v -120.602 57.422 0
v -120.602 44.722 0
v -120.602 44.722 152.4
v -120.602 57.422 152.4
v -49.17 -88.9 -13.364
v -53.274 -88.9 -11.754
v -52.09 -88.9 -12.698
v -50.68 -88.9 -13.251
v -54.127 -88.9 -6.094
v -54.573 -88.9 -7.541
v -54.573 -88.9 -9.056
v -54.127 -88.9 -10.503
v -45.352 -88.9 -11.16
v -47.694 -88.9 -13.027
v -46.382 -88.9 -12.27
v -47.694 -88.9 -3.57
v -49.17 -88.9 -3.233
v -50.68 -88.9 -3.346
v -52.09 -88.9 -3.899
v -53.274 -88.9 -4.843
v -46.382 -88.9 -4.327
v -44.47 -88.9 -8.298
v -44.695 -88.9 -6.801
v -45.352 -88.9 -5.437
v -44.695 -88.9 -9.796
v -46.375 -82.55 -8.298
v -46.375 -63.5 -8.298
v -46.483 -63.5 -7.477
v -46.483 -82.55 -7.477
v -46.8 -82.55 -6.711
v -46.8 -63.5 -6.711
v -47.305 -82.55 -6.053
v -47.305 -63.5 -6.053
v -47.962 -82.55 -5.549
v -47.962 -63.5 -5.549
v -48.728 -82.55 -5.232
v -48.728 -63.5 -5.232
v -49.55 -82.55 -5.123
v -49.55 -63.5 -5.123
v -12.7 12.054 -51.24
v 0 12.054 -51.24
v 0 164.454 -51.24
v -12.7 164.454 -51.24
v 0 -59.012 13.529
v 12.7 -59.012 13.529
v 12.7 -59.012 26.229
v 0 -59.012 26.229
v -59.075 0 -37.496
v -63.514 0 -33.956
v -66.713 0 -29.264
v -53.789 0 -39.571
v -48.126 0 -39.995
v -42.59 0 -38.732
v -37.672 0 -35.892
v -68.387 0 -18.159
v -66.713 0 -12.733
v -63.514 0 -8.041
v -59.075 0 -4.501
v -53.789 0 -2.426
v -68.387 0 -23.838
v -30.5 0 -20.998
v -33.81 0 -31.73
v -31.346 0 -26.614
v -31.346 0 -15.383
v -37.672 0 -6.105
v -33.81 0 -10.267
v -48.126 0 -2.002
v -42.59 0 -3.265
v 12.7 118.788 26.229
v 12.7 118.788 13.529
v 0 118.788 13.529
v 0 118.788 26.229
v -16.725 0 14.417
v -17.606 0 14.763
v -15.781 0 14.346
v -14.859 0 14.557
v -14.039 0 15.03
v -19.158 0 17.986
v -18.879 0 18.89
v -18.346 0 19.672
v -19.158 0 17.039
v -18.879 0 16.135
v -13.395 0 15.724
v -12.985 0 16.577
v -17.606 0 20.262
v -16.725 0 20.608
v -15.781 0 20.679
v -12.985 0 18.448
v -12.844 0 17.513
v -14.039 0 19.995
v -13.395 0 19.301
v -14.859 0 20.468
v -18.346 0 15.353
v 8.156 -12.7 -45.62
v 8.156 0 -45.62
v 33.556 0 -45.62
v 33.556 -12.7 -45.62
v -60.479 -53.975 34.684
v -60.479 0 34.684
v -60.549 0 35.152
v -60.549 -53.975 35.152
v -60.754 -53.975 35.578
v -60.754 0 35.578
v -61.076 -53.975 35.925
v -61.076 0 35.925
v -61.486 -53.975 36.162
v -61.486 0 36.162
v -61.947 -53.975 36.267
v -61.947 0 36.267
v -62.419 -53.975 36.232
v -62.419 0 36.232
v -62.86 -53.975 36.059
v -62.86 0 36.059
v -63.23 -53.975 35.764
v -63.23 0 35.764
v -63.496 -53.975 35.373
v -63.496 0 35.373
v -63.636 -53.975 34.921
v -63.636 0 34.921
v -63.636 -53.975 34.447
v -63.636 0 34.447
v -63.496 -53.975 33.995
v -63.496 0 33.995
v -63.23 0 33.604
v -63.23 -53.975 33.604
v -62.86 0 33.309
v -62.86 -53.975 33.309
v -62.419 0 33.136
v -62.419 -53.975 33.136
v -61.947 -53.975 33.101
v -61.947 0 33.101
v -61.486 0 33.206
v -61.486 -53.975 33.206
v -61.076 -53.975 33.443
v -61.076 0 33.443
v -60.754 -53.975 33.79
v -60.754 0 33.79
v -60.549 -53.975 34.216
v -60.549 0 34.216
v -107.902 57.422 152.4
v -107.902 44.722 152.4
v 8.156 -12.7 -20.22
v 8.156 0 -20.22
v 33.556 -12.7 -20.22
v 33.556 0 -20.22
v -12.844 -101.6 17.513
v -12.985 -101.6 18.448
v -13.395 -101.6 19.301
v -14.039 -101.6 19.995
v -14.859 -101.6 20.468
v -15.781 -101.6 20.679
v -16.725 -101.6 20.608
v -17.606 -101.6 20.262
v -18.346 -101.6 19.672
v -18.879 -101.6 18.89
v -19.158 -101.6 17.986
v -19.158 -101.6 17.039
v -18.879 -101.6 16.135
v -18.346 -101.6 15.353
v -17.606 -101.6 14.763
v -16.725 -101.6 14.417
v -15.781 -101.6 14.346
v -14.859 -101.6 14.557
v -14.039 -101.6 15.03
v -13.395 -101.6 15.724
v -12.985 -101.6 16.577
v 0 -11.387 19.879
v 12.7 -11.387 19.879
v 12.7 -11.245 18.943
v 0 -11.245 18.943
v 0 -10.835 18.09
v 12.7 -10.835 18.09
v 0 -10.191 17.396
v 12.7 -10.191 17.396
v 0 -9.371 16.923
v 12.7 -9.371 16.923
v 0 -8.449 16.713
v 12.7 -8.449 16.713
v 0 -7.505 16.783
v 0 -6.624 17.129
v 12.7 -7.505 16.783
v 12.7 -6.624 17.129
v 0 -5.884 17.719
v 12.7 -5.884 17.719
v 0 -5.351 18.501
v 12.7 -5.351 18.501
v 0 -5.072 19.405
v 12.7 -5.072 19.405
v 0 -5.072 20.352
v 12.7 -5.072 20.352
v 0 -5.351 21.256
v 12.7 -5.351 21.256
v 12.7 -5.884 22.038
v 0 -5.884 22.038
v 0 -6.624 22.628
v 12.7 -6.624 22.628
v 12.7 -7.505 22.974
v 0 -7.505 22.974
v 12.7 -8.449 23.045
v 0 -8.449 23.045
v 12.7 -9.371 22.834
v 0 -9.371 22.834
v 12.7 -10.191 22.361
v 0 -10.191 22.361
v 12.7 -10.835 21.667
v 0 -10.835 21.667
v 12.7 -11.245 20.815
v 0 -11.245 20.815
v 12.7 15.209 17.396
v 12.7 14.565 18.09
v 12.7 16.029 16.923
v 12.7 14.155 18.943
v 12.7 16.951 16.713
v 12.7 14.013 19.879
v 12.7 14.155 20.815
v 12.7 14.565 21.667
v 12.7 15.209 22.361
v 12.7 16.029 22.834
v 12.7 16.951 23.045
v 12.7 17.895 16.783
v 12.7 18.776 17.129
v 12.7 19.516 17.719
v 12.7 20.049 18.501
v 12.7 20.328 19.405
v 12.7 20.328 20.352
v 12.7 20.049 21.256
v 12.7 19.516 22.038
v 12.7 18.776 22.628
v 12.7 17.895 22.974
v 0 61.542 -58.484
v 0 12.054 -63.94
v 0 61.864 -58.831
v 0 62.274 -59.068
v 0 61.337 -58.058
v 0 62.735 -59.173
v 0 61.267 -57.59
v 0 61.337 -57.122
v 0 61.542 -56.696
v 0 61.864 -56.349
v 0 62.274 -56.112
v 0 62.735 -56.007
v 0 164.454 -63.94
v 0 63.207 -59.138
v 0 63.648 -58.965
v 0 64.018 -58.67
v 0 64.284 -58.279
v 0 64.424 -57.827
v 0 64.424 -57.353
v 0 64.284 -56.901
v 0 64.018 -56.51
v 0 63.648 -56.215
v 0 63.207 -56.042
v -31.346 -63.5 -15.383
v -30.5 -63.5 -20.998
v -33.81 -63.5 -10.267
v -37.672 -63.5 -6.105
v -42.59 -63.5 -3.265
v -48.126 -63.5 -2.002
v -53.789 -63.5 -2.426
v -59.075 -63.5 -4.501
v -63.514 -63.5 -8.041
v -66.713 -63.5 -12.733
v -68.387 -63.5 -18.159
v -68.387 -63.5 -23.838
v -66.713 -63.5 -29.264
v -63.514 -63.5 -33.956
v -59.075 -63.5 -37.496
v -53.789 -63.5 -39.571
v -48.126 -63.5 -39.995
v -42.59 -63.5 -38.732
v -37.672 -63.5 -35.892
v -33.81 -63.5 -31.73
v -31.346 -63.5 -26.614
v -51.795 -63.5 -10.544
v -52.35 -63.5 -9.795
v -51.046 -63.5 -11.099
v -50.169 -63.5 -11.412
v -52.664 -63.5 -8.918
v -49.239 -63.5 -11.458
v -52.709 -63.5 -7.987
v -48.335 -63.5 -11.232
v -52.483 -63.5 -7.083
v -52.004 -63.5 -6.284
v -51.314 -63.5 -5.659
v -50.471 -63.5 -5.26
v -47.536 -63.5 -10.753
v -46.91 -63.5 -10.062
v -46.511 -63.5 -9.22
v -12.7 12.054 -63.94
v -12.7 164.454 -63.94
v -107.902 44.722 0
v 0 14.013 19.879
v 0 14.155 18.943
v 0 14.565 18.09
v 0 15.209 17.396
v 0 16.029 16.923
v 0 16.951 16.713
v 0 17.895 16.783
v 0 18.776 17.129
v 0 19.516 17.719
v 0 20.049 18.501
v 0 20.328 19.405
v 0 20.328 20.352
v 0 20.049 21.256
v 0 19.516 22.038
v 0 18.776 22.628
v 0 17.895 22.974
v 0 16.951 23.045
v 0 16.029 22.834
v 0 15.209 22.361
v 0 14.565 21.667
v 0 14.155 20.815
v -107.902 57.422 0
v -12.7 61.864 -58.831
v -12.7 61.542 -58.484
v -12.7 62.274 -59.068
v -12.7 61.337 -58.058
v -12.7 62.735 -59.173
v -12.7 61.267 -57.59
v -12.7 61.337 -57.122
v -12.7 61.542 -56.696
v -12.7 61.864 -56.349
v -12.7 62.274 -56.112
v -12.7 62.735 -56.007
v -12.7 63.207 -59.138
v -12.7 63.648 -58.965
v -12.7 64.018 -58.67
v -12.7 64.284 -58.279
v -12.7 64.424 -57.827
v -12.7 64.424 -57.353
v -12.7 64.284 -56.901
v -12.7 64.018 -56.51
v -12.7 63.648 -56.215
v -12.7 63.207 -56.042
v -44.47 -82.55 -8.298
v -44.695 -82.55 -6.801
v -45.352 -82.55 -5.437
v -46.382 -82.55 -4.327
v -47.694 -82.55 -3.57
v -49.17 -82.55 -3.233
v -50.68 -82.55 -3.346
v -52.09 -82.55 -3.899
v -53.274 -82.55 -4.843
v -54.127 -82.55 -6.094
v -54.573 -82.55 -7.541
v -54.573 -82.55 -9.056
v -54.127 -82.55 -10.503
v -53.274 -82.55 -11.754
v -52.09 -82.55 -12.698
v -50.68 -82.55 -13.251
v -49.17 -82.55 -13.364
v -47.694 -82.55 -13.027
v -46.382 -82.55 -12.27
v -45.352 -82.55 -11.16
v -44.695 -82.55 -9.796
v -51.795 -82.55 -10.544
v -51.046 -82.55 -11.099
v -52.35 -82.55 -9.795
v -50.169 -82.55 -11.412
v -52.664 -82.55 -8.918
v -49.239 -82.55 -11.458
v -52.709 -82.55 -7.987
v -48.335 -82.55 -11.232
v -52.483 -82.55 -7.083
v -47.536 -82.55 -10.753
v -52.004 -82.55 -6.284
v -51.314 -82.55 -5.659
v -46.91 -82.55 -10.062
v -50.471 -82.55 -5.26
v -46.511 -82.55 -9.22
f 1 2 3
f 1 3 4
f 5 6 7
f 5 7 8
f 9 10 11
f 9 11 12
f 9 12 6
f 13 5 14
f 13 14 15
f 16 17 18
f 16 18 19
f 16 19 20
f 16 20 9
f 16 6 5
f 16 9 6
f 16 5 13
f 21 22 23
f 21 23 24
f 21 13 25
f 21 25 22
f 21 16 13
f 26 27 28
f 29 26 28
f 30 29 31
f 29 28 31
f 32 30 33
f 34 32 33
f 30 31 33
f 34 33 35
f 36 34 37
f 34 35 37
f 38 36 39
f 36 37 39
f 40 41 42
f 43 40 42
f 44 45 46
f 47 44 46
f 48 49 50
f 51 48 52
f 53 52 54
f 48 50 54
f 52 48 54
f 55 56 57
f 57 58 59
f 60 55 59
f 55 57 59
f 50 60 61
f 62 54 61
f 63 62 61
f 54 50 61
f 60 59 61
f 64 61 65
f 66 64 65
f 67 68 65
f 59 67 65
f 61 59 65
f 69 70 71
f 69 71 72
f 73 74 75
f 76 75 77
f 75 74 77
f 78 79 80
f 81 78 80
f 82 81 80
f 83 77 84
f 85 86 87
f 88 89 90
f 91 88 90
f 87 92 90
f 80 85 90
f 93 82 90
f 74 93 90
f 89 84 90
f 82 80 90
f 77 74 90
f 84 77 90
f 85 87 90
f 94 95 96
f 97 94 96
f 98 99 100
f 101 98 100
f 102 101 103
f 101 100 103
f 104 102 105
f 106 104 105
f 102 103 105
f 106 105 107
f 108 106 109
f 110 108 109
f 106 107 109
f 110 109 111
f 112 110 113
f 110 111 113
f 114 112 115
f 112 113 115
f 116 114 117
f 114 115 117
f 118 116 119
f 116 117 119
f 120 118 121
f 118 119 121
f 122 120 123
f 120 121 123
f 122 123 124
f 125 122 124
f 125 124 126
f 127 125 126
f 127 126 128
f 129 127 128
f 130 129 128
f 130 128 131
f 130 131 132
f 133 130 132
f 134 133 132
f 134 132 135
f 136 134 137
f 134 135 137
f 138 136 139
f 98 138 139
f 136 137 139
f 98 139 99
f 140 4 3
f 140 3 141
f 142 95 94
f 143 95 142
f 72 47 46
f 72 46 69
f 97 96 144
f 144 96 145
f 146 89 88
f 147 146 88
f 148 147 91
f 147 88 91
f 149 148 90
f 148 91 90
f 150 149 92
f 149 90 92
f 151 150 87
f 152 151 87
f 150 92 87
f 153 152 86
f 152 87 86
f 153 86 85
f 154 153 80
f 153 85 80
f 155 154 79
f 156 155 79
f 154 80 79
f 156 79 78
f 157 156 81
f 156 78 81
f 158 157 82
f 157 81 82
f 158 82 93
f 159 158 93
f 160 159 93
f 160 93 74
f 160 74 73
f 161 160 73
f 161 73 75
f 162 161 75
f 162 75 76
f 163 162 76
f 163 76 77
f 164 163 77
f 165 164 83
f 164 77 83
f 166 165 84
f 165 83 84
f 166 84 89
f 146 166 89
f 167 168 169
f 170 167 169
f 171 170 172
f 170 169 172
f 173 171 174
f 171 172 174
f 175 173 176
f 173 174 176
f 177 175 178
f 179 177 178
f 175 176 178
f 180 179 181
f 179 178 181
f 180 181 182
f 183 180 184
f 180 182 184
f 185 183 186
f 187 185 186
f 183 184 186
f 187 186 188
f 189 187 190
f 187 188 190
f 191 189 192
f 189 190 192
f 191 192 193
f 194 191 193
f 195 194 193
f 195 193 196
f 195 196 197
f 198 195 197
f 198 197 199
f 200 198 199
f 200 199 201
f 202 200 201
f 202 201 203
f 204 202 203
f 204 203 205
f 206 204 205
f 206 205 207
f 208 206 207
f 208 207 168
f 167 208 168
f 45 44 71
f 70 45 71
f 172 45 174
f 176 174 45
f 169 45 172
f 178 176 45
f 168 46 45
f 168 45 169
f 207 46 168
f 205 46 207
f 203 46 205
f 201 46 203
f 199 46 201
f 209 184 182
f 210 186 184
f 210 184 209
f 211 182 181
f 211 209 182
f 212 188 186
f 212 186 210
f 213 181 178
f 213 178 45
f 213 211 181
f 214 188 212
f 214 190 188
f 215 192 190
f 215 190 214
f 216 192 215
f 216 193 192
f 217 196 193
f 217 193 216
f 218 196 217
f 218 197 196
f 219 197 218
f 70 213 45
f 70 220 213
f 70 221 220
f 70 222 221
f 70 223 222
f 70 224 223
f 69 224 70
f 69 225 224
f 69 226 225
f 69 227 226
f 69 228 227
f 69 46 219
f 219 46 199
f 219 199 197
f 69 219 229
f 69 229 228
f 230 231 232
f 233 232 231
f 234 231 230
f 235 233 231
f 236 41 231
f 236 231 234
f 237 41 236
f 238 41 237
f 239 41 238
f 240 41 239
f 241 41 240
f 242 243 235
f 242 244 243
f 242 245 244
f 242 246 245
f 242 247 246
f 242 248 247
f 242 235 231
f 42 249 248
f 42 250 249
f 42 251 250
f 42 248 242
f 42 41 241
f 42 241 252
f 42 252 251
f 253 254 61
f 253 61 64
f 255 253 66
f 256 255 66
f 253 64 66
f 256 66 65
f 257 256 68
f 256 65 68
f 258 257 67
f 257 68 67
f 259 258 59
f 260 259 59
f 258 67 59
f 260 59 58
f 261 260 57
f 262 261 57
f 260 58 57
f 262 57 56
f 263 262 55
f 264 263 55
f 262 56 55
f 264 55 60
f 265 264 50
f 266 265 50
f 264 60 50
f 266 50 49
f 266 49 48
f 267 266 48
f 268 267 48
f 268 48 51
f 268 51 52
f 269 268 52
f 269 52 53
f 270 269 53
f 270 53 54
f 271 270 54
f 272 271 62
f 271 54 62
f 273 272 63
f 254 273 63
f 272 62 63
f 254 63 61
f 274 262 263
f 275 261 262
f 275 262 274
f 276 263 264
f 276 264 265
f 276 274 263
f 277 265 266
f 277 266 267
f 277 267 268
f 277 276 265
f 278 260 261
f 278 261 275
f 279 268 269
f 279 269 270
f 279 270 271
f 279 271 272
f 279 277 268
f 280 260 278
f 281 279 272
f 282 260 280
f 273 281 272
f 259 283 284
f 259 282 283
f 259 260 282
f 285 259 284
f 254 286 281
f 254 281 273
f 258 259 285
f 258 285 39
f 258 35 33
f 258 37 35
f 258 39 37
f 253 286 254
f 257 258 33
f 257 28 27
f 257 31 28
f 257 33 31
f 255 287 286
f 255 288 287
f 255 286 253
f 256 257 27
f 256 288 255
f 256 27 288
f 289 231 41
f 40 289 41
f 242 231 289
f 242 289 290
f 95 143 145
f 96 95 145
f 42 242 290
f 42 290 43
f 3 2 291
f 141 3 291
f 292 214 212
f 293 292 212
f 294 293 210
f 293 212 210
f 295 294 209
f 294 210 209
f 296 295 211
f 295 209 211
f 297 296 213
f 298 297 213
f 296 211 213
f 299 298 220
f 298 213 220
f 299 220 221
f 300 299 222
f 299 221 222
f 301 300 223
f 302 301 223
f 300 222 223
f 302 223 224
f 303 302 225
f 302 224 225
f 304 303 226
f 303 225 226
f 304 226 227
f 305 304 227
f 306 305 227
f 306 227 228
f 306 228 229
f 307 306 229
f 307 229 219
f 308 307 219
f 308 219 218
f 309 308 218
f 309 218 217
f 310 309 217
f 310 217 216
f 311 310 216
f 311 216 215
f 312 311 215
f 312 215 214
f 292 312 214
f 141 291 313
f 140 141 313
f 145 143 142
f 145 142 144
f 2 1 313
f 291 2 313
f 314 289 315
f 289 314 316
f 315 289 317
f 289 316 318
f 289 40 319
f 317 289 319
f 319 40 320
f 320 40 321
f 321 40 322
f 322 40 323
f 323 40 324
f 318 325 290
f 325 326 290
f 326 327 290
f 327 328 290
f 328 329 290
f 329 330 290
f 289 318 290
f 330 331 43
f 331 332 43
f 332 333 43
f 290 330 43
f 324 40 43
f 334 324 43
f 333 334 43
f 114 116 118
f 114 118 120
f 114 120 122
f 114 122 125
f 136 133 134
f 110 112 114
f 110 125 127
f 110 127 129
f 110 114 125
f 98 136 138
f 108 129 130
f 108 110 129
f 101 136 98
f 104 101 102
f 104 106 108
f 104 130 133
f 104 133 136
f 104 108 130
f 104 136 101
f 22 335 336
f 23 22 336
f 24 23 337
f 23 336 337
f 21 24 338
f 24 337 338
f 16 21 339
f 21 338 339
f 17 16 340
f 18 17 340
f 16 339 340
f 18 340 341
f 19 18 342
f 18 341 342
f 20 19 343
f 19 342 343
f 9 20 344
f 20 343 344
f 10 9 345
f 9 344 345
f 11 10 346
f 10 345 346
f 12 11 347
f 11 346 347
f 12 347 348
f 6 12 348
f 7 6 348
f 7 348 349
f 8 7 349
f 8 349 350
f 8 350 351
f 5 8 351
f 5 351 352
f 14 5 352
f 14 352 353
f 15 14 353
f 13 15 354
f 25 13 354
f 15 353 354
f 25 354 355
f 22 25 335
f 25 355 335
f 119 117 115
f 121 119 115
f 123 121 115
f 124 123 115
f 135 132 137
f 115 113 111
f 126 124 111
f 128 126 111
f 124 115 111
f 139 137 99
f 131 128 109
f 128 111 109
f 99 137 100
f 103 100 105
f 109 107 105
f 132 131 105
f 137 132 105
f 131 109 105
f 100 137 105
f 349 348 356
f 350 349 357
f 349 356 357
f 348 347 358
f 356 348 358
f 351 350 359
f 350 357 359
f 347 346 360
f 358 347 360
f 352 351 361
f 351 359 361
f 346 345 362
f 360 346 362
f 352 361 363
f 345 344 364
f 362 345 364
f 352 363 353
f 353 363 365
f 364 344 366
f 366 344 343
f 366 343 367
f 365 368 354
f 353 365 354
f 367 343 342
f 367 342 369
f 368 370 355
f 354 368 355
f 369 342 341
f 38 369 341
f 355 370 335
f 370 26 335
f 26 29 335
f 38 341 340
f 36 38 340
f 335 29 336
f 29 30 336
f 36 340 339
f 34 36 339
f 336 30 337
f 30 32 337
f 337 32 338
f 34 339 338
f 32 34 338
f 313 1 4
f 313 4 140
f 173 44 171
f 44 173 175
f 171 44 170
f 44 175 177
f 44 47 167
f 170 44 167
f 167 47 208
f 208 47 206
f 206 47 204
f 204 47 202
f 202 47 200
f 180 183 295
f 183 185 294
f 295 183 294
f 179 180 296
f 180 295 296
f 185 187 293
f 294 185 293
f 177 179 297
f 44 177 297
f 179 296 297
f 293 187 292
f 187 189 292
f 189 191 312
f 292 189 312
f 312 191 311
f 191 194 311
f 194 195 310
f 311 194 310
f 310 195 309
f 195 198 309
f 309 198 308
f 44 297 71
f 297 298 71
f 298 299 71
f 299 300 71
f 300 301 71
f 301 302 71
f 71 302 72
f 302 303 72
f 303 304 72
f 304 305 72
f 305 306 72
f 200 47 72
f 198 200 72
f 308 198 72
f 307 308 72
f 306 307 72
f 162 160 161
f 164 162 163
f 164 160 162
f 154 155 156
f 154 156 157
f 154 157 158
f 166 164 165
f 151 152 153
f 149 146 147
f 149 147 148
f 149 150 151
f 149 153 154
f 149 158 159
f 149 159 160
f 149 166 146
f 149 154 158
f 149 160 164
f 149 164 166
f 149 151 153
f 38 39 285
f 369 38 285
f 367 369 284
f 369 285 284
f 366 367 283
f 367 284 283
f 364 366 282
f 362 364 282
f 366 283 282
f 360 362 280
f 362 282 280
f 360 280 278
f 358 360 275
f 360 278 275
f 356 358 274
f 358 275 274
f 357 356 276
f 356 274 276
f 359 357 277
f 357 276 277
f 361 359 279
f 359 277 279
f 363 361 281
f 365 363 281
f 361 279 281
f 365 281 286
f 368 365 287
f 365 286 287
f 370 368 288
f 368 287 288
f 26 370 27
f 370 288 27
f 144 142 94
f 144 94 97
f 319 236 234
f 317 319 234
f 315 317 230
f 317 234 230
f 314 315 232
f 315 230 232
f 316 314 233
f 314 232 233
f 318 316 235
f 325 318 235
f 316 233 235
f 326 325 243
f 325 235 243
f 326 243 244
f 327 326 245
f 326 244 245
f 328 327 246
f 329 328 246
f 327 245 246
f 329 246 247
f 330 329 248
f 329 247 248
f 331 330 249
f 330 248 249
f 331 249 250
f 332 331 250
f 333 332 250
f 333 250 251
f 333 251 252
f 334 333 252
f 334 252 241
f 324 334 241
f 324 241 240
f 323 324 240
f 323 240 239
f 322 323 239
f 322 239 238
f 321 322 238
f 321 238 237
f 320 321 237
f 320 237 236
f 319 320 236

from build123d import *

# Parameters (mm, degrees)
F0_W      = 177.8
F0_H      = 12.7
F1_DEPTH  = 12.7
F3_DEPTH  = 25.4
F4_R      = 3.175
F5_DEPTH  = 101.6
F6_R      = 19.05
F7_DEPTH  = 63.5
F9_DEPTH  = 19.05
F10_R     = 5.08
F10_R_2   = 3.175
F11_DEPTH = 6.35
F12_W     = 12.7
F12_H     = 12.7
F13_DEPTH = 152.4
F14_W     = 152.4
F14_H     = 12.7
F15_DEPTH = 12.7
F17_DEPTH = 25.4
F18_R     = 1.5875
F19_DEPTH = 53.975
F20_W     = 25.4
F20_H     = 25.4
F21_DEPTH = 12.7


with BuildPart() as f1:
    # F0 (on Right) → F1 (new body)
    with BuildSketch(Plane.YZ):
        with Locations((29.888474, 19.878663)):
            Rectangle(F0_W, F0_H)
    extrude(amount=F1_DEPTH)

    # F2 (on face) → F3 (cut)
    with BuildSketch(Plane.YZ.offset(12.7)):
        with BuildLine():
            ThreePointArc((-5.036526, 19.878663), (-8.211526, 23.053663), (-11.386526, 19.878663))
            Line((-11.386526, 19.878663), (-8.211526, 19.878663))
            Line((-8.211526, 19.878663), (-5.036526, 19.878663))
        make_face()
        with BuildLine():
            Line((-8.211526, 19.878663), (-11.386526, 19.878663))
            ThreePointArc((-11.386526, 19.878663), (-8.211526, 16.703663), (-5.036526, 19.878663))
            Line((-5.036526, 19.878663), (-8.211526, 19.878663))
        make_face()
        with BuildLine():
            ThreePointArc((20.363474, 19.878663), (17.188474, 23.053663), (14.013474, 19.878663))
            ThreePointArc((14.013474, 19.878663), (17.188474, 16.703663), (20.363474, 19.878663))
        make_face()
    extrude(amount=-F3_DEPTH, mode=Mode.SUBTRACT)


with BuildPart() as f5:
    # F4 (on Front) → F5 (new body)
    with BuildSketch(Plane.XZ):
        with Locations((-16.018599, 17.512562)):
            Circle(F4_R)
    extrude(amount=F5_DEPTH)


with BuildPart() as f7:
    # F6 (on Front) → F7 (new body)
    with BuildSketch(Plane.XZ):
        with Locations((-49.549762, -20.998476)):
            Circle(F6_R)
    extrude(amount=F7_DEPTH)

    # F8 (on face) → F9 (join)
    with BuildSketch(Plane.XZ.offset(63.5)):
        with BuildLine():
            ThreePointArc((-49.549762, -5.123476), (-51.794826, -10.54354), (-46.374762, -8.298476))
            ThreePointArc((-46.374762, -8.298476), (-47.304698, -6.053412), (-49.549762, -5.123476))
        make_face()
    extrude(amount=F9_DEPTH)

    # F10 (on face) → F11 (join)
    with BuildSketch(Plane.XZ.offset(82.55)):
        with Locations((-49.549762, -8.298476)):
            Circle(F10_R)
        with Locations((-49.549762, -8.298476)):
            Circle(F10_R_2, mode=Mode.SUBTRACT)
        with Locations((-49.549762, -8.298476)):
            Circle(F10_R_2)
    extrude(amount=F11_DEPTH)


with BuildPart() as f13:
    # F12 (on Top) → F13 (new body)
    with BuildSketch(Plane.XY):
        with Locations((-114.252333, 51.071715)):
            Rectangle(F12_W, F12_H)
    extrude(amount=F13_DEPTH)


with BuildPart() as f15:
    # F14 (on Right) → F15 (new body)
    with BuildSketch(Plane.YZ):
        with Locations((88.254012, -57.590056)):
            Rectangle(F14_W, F14_H)
    extrude(amount=-F15_DEPTH)

    # F16 (on face) → F17 (cut)
    with BuildSketch(Plane.YZ):
        with BuildLine():
            ThreePointArc((64.441512, -57.590056), (62.854012, -56.002556), (61.266512, -57.590056))
            ThreePointArc((61.266512, -57.590056), (62.854012, -59.177556), (64.441512, -57.590056))
        make_face()
    extrude(amount=-F17_DEPTH, mode=Mode.SUBTRACT)


with BuildPart() as f19:
    # F18 (on Front) → F19 (new body)
    with BuildSketch(Plane.XZ):
        with Locations((-62.066108, 34.683995)):
            Circle(F18_R)
    extrude(amount=F19_DEPTH)


with BuildPart() as f21:
    # F20 (on Front) → F21 (new body)
    with BuildSketch(Plane.XZ):
        with Locations((20.856114, -32.920214)):
            Rectangle(F20_W, F20_H)
    extrude(amount=F21_DEPTH)


solid = Compound([f1.part, f5.part, f7.part, f13.part, f15.part, f19.part, f21.part])
